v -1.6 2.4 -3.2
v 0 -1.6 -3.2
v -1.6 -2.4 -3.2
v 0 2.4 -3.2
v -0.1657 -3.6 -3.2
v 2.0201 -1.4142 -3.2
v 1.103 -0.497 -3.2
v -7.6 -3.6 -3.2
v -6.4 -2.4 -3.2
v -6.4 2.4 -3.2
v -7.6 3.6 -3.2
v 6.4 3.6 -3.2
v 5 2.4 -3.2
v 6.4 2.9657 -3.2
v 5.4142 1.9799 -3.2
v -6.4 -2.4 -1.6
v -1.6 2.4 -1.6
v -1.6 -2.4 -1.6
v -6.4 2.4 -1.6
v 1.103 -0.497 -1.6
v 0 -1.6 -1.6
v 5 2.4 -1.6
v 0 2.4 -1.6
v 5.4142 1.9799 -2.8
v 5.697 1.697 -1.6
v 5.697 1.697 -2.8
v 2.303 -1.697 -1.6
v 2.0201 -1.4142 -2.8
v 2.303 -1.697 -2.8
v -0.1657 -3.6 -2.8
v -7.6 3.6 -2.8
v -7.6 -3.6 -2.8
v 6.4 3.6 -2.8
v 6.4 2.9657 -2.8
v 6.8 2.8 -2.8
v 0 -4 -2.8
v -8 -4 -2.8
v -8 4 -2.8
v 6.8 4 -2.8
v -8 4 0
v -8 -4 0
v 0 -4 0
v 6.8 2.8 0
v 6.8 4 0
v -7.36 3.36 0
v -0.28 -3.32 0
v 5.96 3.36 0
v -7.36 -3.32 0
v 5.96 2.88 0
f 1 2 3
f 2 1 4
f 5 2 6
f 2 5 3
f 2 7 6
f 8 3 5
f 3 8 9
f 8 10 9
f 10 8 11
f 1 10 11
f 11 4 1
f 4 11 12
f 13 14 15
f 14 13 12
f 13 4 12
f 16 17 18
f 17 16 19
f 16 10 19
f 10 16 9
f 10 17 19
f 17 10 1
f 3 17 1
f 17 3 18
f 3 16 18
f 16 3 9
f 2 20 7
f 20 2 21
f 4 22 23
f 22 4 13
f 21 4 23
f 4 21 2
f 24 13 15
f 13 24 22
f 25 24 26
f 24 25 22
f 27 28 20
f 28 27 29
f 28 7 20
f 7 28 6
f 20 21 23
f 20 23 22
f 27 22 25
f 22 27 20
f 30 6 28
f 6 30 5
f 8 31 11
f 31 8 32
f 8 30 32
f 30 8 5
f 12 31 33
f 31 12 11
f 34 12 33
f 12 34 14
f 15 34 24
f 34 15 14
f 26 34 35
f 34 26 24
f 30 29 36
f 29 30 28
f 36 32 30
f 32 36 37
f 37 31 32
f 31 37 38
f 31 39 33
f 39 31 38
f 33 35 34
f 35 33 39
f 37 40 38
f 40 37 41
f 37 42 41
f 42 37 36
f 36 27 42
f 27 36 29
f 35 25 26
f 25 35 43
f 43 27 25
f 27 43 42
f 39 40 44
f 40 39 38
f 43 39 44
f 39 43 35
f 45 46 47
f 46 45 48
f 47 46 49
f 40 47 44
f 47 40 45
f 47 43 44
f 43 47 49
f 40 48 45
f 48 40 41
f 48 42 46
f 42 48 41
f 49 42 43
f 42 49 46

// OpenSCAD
// file: ../p/rect3.scad
use <../lib.scad>
function ldraw_lib__rect3() = [
// 0 Rectangle with 3 Edges
// 0 Name: rect3.dat
// 0 Author: Mark Kennedy [mkennedy]
// 0 !LDRAW_ORG Primitive UPDATE 2010-01
// 0 !LICENSE Licensed under CC BY 4.0 : see CAreadme.txt
// 
// 0 BFC CERTIFY CCW
  [0,"BFC","CERTIFY"],
  [0,"BFC","CCW"],
// 
// 0 !HISTORY 2003-08-01 [PTadmin] Official Update 2003-02
// 0 !HISTORY 2007-06-24 [PTadmin] Header formatted for Contributor Agreement
// 0 !HISTORY 2008-07-01 [PTadmin] Official Update 2008-01
// 0 !HISTORY 2010-01-17 [mikeheide] Change winding to CCW
// 0 !HISTORY 2010-04-05 [PTadmin] Official Update 2010-01
// 
// 
// 2 24 1 0 1 -1 0 1
  [2,24,1,0,1,-1,0,1],
// 2 24 1 0 1 1 0 -1
  [2,24,1,0,1,1,0,-1],
// 2 24 -1 0 1 -1 0 -1
  [2,24,-1,0,1,-1,0,-1],
// 4 16 -1 0 1 -1 0 -1 1 0 -1 1 0 1
  [4,16,-1,0,1,-1,0,-1,1,0,-1,1,0,1],
// 0 //
];
module ldraw_lib__rect3(step=0, col=false, unit=2/5, alt=false, line=0.2, solid=!$preview)
    makepoly(ldraw_lib__rect3(), step=step, col=col, unit=unit, alt=alt, line=line, solid=solid);
ldraw_lib__rect3(line=0.2);
// file: ../p/rect.scad
use <../lib.scad>
function ldraw_lib__rect() = [
// 0 Rectangle
// 0 Name: rect.dat
// 0 Author: James Jessiman
// 0 !LDRAW_ORG Primitive UPDATE 2010-01
// 0 !LICENSE Licensed under CC BY 4.0 : see CAreadme.txt
// 
// 0 BFC CERTIFY CCW
  [0,"BFC","CERTIFY"],
  [0,"BFC","CCW"],
// 
// 0 !HISTORY 2002-04-05 [hafhead] Added BFC statement
// 0 !HISTORY 2002-04-25 [PTadmin] Official Update 2002-02
// 0 !HISTORY 2007-06-24 [PTadmin] Header formatted for Contributor Agreement
// 0 !HISTORY 2008-07-01 [PTadmin] Official Update 2008-01
// 0 !HISTORY 2010-01-17 [mikeheide] changed winding to CCW
// 0 !HISTORY 2010-04-05 [PTadmin] Official Update 2010-01
// 
// 
// 2 24 1 0 1 -1 0 1
  [2,24,1,0,1,-1,0,1],
// 2 24 -1 0 1 -1 0 -1
  [2,24,-1,0,1,-1,0,-1],
// 2 24 -1 0 -1 1 0 -1
  [2,24,-1,0,-1,1,0,-1],
// 2 24 1 0 -1 1 0 1
  [2,24,1,0,-1,1,0,1],
// 4 16 -1 0 1 -1 0 -1 1 0 -1 1 0 1
  [4,16,-1,0,1,-1,0,-1,1,0,-1,1,0,1],
// 0
];
module ldraw_lib__rect(step=0, col=false, unit=2/5, alt=false, line=0.2, solid=!$preview)
    makepoly(ldraw_lib__rect(), step=step, col=col, unit=unit, alt=alt, line=line, solid=solid);
ldraw_lib__rect(line=0.2);
// file: ../p/box5.scad
use <../lib.scad>
function ldraw_lib__box5() = [
// 0 Box with 5 Faces and All Edges
// 0 Name: box5.dat
// 0 Author: James Jessiman
// 0 !LDRAW_ORG Primitive UPDATE 2012-01
// 0 !LICENSE Licensed under CC BY 4.0 : see CAreadme.txt
// 
// 0 BFC CERTIFY CCW
  [0,"BFC","CERTIFY"],
  [0,"BFC","CCW"],
// 
// 0 !HISTORY 2002-04-03 [sbliss] Modified for BFC compliance
// 0 !HISTORY 2002-04-25 [PTadmin] Official Update 2002-02
// 0 !HISTORY 2007-06-24 [PTadmin] Header formatted for Contributor Agreement
// 0 !HISTORY 2008-07-01 [PTadmin] Official Update 2008-01
// 0 !HISTORY 2012-02-16 [Philo] Changed to CCW
// 0 !HISTORY 2012-03-30 [PTadmin] Official Update 2012-01
// 
// 
// 2 24 1 1 1 -1 1 1
  [2,24,1,1,1,-1,1,1],
// 2 24 -1 1 1 -1 1 -1
  [2,24,-1,1,1,-1,1,-1],
// 2 24 -1 1 -1 1 1 -1
  [2,24,-1,1,-1,1,1,-1],
// 2 24 1 1 -1 1 1 1
  [2,24,1,1,-1,1,1,1],
// 2 24 1 0 1 -1 0 1
  [2,24,1,0,1,-1,0,1],
// 2 24 -1 0 1 -1 0 -1
  [2,24,-1,0,1,-1,0,-1],
// 2 24 -1 0 -1 1 0 -1
  [2,24,-1,0,-1,1,0,-1],
// 2 24 1 0 -1 1 0 1
  [2,24,1,0,-1,1,0,1],
// 2 24 1 0 1 1 1 1
  [2,24,1,0,1,1,1,1],
// 2 24 -1 0 1 -1 1 1
  [2,24,-1,0,1,-1,1,1],
// 2 24 1 0 -1 1 1 -1
  [2,24,1,0,-1,1,1,-1],
// 2 24 -1 0 -1 -1 1 -1
  [2,24,-1,0,-1,-1,1,-1],
// 4 16 -1 1 1 1 1 1 1 1 -1 -1 1 -1
  [4,16,-1,1,1,1,1,1,1,1,-1,-1,1,-1],
// 4 16 -1 1 1 -1 0 1 1 0 1 1 1 1
  [4,16,-1,1,1,-1,0,1,1,0,1,1,1,1],
// 4 16 -1 1 -1 -1 0 -1 -1 0 1 -1 1 1
  [4,16,-1,1,-1,-1,0,-1,-1,0,1,-1,1,1],
// 4 16 1 1 -1 1 0 -1 -1 0 -1 -1 1 -1
  [4,16,1,1,-1,1,0,-1,-1,0,-1,-1,1,-1],
// 4 16 1 1 1 1 0 1 1 0 -1 1 1 -1
  [4,16,1,1,1,1,0,1,1,0,-1,1,1,-1],
];
module ldraw_lib__box5(step=0, col=false, unit=2/5, alt=false, line=0.2, solid=!$preview)
    makepoly(ldraw_lib__box5(), step=step, col=col, unit=unit, alt=alt, line=line, solid=solid);
ldraw_lib__box5(line=0.2);
// file: ../p/box2-7.scad
use <../lib.scad>
function ldraw_lib__box2_7() = [
// 0 Box with  2 Faces without  7 Edges
// 0 Name: box2-7.dat
// 0 Author: Willy Tschager [Holly-Wood]
// 0 !LDRAW_ORG Primitive UPDATE 2024-01
// 0 !LICENSE Licensed under CC BY 4.0 : see CAreadme.txt
// 
// 0 BFC CERTIFY CCW
  [0,"BFC","CERTIFY"],
  [0,"BFC","CCW"],
// 
// 0 !HISTORY 2009-05-02 [PTadmin] Official Update 2009-01
// 0 !HISTORY 2024-01-02 [Holly-Wood] Complete re-write, original by guyvivan
// 0 !HISTORY 2024-01-29 [OrionP] Official Update 2024-01
// 
// 2 24 -1 1 -1 -1 1 1
  [2,24,-1,1,-1,-1,1,1],
// 2 24 1 1 1 1 1 -1
  [2,24,1,1,1,1,1,-1],
// 4 16 -1 1 1 1 1 1 1 1 -1 -1 1 -1
  [4,16,-1,1,1,1,1,1,1,1,-1,-1,1,-1],
// 
// 2 24 -1 1 1 -1 -1 1
  [2,24,-1,1,1,-1,-1,1],
// 2 24 1 1 1 1 -1 1
  [2,24,1,1,1,1,-1,1],
// 4 16 1 -1 1 1 1 1 -1 1 1 -1 -1 1
  [4,16,1,-1,1,1,1,1,-1,1,1,-1,-1,1],
// 
// 2 24 -1 1 1 1 1 1
  [2,24,-1,1,1,1,1,1],
];
module ldraw_lib__box2_7(step=0, col=false, unit=2/5, alt=false, line=0.2, solid=!$preview)
    makepoly(ldraw_lib__box2_7(), step=step, col=col, unit=unit, alt=alt, line=line, solid=solid);
ldraw_lib__box2_7(line=0.2);
// file: ../p/box2-5.scad
use <../lib.scad>
function ldraw_lib__box2_5() = [
// 0 Box with 2 Faces without 5 Edges
// 0 Name: box2-5.dat
// 0 Author: Steffen [Steffen]
// 0 !LDRAW_ORG Primitive UPDATE 2003-03
// 0 !LICENSE Licensed under CC BY 4.0 : see CAreadme.txt
// 
// 0 BFC CERTIFY CCW
  [0,"BFC","CERTIFY"],
  [0,"BFC","CCW"],
// 
// 0 !HISTORY 2003-12-19 [PTadmin] Official Update 2003-03
// 0 !HISTORY 2007-06-24 [PTadmin] Header formatted for Contributor Agreement
// 0 !HISTORY 2008-07-01 [PTadmin] Official Update 2008-01
// 
// 
// 2 24 1 1 1 -1 1 1
  [2,24,1,1,1,-1,1,1],
// 2 24 1 1 -1 -1 1 -1
  [2,24,1,1,-1,-1,1,-1],
// 2 24 1 -1 1 -1 -1 1
  [2,24,1,-1,1,-1,-1,1],
// 2 24 -1 -1 1 -1 1 1
  [2,24,-1,-1,1,-1,1,1],
// 2 24 1 -1 1 1 1 1
  [2,24,1,-1,1,1,1,1],
// 2 24 -1 1 -1 -1 1 1
  [2,24,-1,1,-1,-1,1,1],
// 2 24 1 1 -1 1 1 1
  [2,24,1,1,-1,1,1,1],
// 4 16 1 1 1 1 1 -1 -1 1 -1 -1 1 1
  [4,16,1,1,1,1,1,-1,-1,1,-1,-1,1,1],
// 4 16 1 1 1 -1 1 1 -1 -1 1 1 -1 1
  [4,16,1,1,1,-1,1,1,-1,-1,1,1,-1,1],
// 0
];
module ldraw_lib__box2_5(step=0, col=false, unit=2/5, alt=false, line=0.2, solid=!$preview)
    makepoly(ldraw_lib__box2_5(), step=step, col=col, unit=unit, alt=alt, line=line, solid=solid);
ldraw_lib__box2_5(line=0.2);
// file: s/5092s01.scad
use <../../lib.scad>
use <../../p/box2-5.scad>
use <../../p/box2-7.scad>
use <../../p/box5.scad>
use <../../p/rect.scad>
use <../../p/rect3.scad>
function ldraw_lib__s__5092s01() = [
// 0 ~Tile  1 x  2 Cut Right 45 Degree without Patternable Surfaces
// 0 Name: s\5092s01.dat
// 0 Author: Gerald Lasser [GeraldLasser]
// 0 !LDRAW_ORG Subpart UPDATE 2025-03
// 0 !LICENSE Licensed under CC BY 4.0 : see CAreadme.txt
// 
// 0 BFC CERTIFY CCW
  [0,"BFC","CERTIFY"],
  [0,"BFC","CCW"],
// 
// 0 !HISTORY 2025-03-30 [OrionP] Official Update 2025-03
// 
// 0 // Bottom
// 4 16 -4 8 6 0 8 6 0 8 -4 -4 8 -6
  [4,16,-4,8,6,0,8,6,0,8,-4,-4,8,-6],
// 4 16 5.0503 8 -3.5355 -.4142 8 -9 -4 8 -6 0 8 -4
  [4,16,5.0503,8,-3.5355,-.4142,8,-9,-4,8,-6,0,8,-4],
// 3 16 0 8 -4 2.7574 8 -1.2426 5.0503 8 -3.5355
  [3,16,0,8,-4,2.7574,8,-1.2426,5.0503,8,-3.5355],
// 4 16 -19 8 -9 -16 8 -6 -4 8 -6 -.4142 8 -9
  [4,16,-19,8,-9,-16,8,-6,-4,8,-6,-.4142,8,-9],
// 4 16 -19 8 9 -16 8 6 -16 8 -6 -19 8 -9
  [4,16,-19,8,9,-16,8,6,-16,8,-6,-19,8,-9],
// 3 16 -4 8 6 -16 8 6 -19 8 9
  [3,16,-4,8,6,-16,8,6,-19,8,9],
// 4 16 -19 8 9 16 8 9 0 8 6 -4 8 6
  [4,16,-19,8,9,16,8,9,0,8,6,-4,8,6],
// 4 16 16 8 7.4142 13.5355 8 4.9497 12.5 8 6 16 8 9
  [4,16,16,8,7.4142,13.5355,8,4.9497,12.5,8,6,16,8,9],
// 3 16 12.5 8 6 0 8 6 16 8 9
  [3,16,12.5,8,6,0,8,6,16,8,9],
// 0 BFC INVERTNEXT
  [0,"BFC","INVERTNEXT"],
// 1 16 -10 8 0 0 0 -6 0 -4 0 -6 0 0 box5.dat
  [1,16,-10,8,0,0,0,-6,0,-4,0,-6,0,0, ldraw_lib__box5()],
// 1 16 1.3787 6 -2.6213 0 0 1.3787 -2 0 0 0 -1 1.3787 rect3.dat
  [1,16,1.3787,6,-2.6213,0,0,1.3787,-2,0,0,0,-1,1.3787, ldraw_lib__rect3()],
// 0 BFC INVERTNEXT
  [0,"BFC","INVERTNEXT"],
// 1 16 6.25 6 1 0 0 -6.25 -2 0 0 0 5 0 box2-5.dat
  [1,16,6.25,6,1,0,0,-6.25,-2,0,0,0,5,0, ldraw_lib__box2_5()],
// 4 16 13.5355 8 4.9497 13.5355 7 4.9497 12.5 4 6 12.5 8 6
  [4,16,13.5355,8,4.9497,13.5355,7,4.9497,12.5,4,6,12.5,8,6],
// 4 16 12.5 4 6 13.5355 7 4.9497 14.2426 7 4.2426 14.2426 4 4.2426
  [4,16,12.5,4,6,13.5355,7,4.9497,14.2426,7,4.2426,14.2426,4,4.2426],
// 4 16 5.7574 7 -4.2426 5.0503 7 -3.5355 2.7574 4 -1.2426 5.7574 4 -4.2426
  [4,16,5.7574,7,-4.2426,5.0503,7,-3.5355,2.7574,4,-1.2426,5.7574,4,-4.2426],
// 4 16 2.7574 4 -1.2426 5.0503 7 -3.5355 5.0503 8 -3.5355 2.7574 8 -1.2426
  [4,16,2.7574,4,-1.2426,5.0503,7,-3.5355,5.0503,8,-3.5355,2.7574,8,-1.2426],
// 2 24 13.5355 7 4.9497 14.2426 7 4.2426
  [2,24,13.5355,7,4.9497,14.2426,7,4.2426],
// 2 24 5.0503 7 -3.5355 5.7574 7 -4.2426
  [2,24,5.0503,7,-3.5355,5.7574,7,-4.2426],
// 2 24 13.5355 8 4.9497 12.5 8 6
  [2,24,13.5355,8,4.9497,12.5,8,6],
// 2 24 2.7574 8 -1.2426 5.0503 8 -3.5355
  [2,24,2.7574,8,-1.2426,5.0503,8,-3.5355],
// 3 16 2.7574 4 -1.2426 0 4 -4 0 4 6
  [3,16,2.7574,4,-1.2426,0,4,-4,0,4,6],
// 3 16 2.7574 4 -1.2426 0 4 6 12.5 4 6
  [3,16,2.7574,4,-1.2426,0,4,6,12.5,4,6],
// 4 16 2.7574 4 -1.2426 12.5 4 6 14.2426 4 4.2426 5.7574 4 -4.2426
  [4,16,2.7574,4,-1.2426,12.5,4,6,14.2426,4,4.2426,5.7574,4,-4.2426],
// 2 24 12.5 4 6 14.2426 4 4.2426
  [2,24,12.5,4,6,14.2426,4,4.2426],
// 2 24 14.2426 4 4.2426 5.7574 4 -4.2426
  [2,24,14.2426,4,4.2426,5.7574,4,-4.2426],
// 2 24 5.7574 4 -4.2426 2.7574 4 -1.2426
  [2,24,5.7574,4,-4.2426,2.7574,4,-1.2426],
// 
// 0 // Lip
// 1 16 2.318 7.5 -6.2678 2.73225 -1 0 0 0 .5 2.73225 0 0 rect.dat
  [1,16,2.318,7.5,-6.2678,2.73225,-1,0,0,0,.5,2.73225,0,0, ldraw_lib__rect()],
// 1 16 -9.7071 7.5 0 0 -9.2929 0 .5 0 0 0 0 -9 box2-7.dat
  [1,16,-9.7071,7.5,0,0,-9.2929,0,.5,0,0,0,0,-9, ldraw_lib__box2_7()],
// 1 16 -1.5 7.5 8.2071 0 0 17.5 -.5 0 0 0 .7929 0 box2-5.dat
  [1,16,-1.5,7.5,8.2071,0,0,17.5,-.5,0,0,0,.7929,0, ldraw_lib__box2_5()],
// 1 16 14.76775 7.5 6.18195 0 0 -1.23225 -.5 0 0 0 1 -1.23225 rect3.dat
  [1,16,14.76775,7.5,6.18195,0,0,-1.23225,-.5,0,0,0,1,-1.23225, ldraw_lib__rect3()],
// 4 16 13.5355 7 4.9497 16 7 7.4142 17 7 7 14.2426 7 4.2426
  [4,16,13.5355,7,4.9497,16,7,7.4142,17,7,7,14.2426,7,4.2426],
// 4 16 -.4142 7 -9 5.0503 7 -3.5355 5.7574 7 -4.2426 0 7 -10
  [4,16,-.4142,7,-9,5.0503,7,-3.5355,5.7574,7,-4.2426,0,7,-10],
// 4 16 -.4142 7 -9 0 7 -10 -20 7 -10 -19 7 -9
  [4,16,-.4142,7,-9,0,7,-10,-20,7,-10,-19,7,-9],
// 4 16 -19 7 -9 -20 7 -10 -20 7 10 -19 7 9
  [4,16,-19,7,-9,-20,7,-10,-20,7,10,-19,7,9],
// 4 16 -19 7 9 -20 7 10 17 7 10 16 7 9
  [4,16,-19,7,9,-20,7,10,17,7,10,16,7,9],
// 4 16 16 7 9 17 7 10 17 7 7 16 7 7.4142
  [4,16,16,7,9,17,7,10,17,7,7,16,7,7.4142],
// 
// 0 // Outside
// 1 16 -10 3.5 0 0 -10 0 3.5 0 0 0 0 -10 box2-5.dat
  [1,16,-10,3.5,0,0,-10,0,3.5,0,0,0,0,-10, ldraw_lib__box2_5()],
// 4 16 0 0 -10 0 7 -10 5.7574 7 -4.2426 5.7574 4 -4.2426
  [4,16,0,0,-10,0,7,-10,5.7574,7,-4.2426,5.7574,4,-4.2426],
// 4 16 14.2426 4 4.2426 14.2426 7 4.2426 17 7 7 17 0 7
  [4,16,14.2426,4,4.2426,14.2426,7,4.2426,17,7,7,17,0,7],
// 4 16 5.7574 4 -4.2426 14.2426 4 4.2426 17 0 7 0 0 -10
  [4,16,5.7574,4,-4.2426,14.2426,4,4.2426,17,0,7,0,0,-10],
// 2 24 14.2426 7 4.2426 14.2426 4 4.2426
  [2,24,14.2426,7,4.2426,14.2426,4,4.2426],
// 2 24 5.7574 4 -4.2426 5.7574 7 -4.2426
  [2,24,5.7574,4,-4.2426,5.7574,7,-4.2426],
// 2 24 17 7 7 14.2426 7 4.2426
  [2,24,17,7,7,14.2426,7,4.2426],
// 2 24 5.7574 7 -4.2426 0 7 -10
  [2,24,5.7574,7,-4.2426,0,7,-10],
// 2 24 0 0 -10 17 0 7
  [2,24,0,0,-10,17,0,7],
// 2 24 17 0 7 17 7 7
  [2,24,17,0,7,17,7,7],
// 1 16 -1.5 3.5 8.5 0 0 18.5 -3.5 0 0 0 1.5 0 box2-7.dat
  [1,16,-1.5,3.5,8.5,0,0,18.5,-3.5,0,0,0,1.5,0, ldraw_lib__box2_7()],
];
module ldraw_lib__s__5092s01(step=0, col=false, unit=2/5, alt=false, line=0.2, solid=!$preview)
    makepoly(ldraw_lib__s__5092s01(), step=step, col=col, unit=unit, alt=alt, line=line, solid=solid);
ldraw_lib__s__5092s01(line=0.2);
// main file
use <../lib.scad>
use <s/5092s01.scad>
function ldraw_lib__5092p01() = [
// 0 Tile 1 x 2 Cut Right 45 Degree with Olive Green Pattern
// 0 Name: 5092p01.dat
// 0 Author: Jeff Jones [notmaster]
// 0 !LDRAW_ORG Part UPDATE 2025-08
// 0 !LICENSE Licensed under CC BY 4.0 : see CAreadme.txt
// 
// 0 BFC CERTIFY CCW
  [0,"BFC","CERTIFY"],
  [0,"BFC","CCW"],
// 
// 0 !KEYWORDS Bricklink 5092pb001, Rebrickable 5092pr0001, Set 76923
// 
// 0 !HISTORY 2025-08-31 [OrionP] Official Update 2025-08
// 
// 1 16 0 0 0 1 0 0 0 1 0 0 0 1 s\5092s01.dat
  [1,16,0,0,0,1,0,0,0,1,0,0,0,1, ldraw_lib__s__5092s01()],
// 4 330 -18.4 0 -8.3 -.7 0 -8.3 14.9 0 8.4 -18.4 0 8.4
  [4,330,-18.4,0,-8.3,-.7,0,-8.3,14.9,0,8.4,-18.4,0,8.4],
// 3 330 14.9 0 8.4 -.7 0 -8.3 14.9 0 7.2
  [3,330,14.9,0,8.4,-.7,0,-8.3,14.9,0,7.2],
// 4 16 17 0 10 -20 0 10 -18.4 0 8.4 14.9 0 8.4
  [4,16,17,0,10,-20,0,10,-18.4,0,8.4,14.9,0,8.4],
// 4 16 17 0 7 17 0 10 14.9 0 8.4 14.9 0 7.2
  [4,16,17,0,7,17,0,10,14.9,0,8.4,14.9,0,7.2],
// 4 16 -18.4 0 8.4 -20 0 10 -20 0 -10 -18.4 0 -8.3
  [4,16,-18.4,0,8.4,-20,0,10,-20,0,-10,-18.4,0,-8.3],
// 4 16 -18.4 0 -8.3 -20 0 -10 0 0 -10 -.7 0 -8.3
  [4,16,-18.4,0,-8.3,-20,0,-10,0,0,-10,-.7,0,-8.3],
// 4 16 -.7 0 -8.3 0 0 -10 17 0 7 14.9 0 7.2
  [4,16,-.7,0,-8.3,0,0,-10,17,0,7,14.9,0,7.2],
];
module ldraw_lib__5092p01(step=0, col=false, unit=2/5, alt=false, line=0.2, solid=!$preview)
    makepoly(ldraw_lib__5092p01(), step=step, col=col, unit=unit, alt=alt, line=line, solid=solid);
ldraw_lib__5092p01(line=0.2);
